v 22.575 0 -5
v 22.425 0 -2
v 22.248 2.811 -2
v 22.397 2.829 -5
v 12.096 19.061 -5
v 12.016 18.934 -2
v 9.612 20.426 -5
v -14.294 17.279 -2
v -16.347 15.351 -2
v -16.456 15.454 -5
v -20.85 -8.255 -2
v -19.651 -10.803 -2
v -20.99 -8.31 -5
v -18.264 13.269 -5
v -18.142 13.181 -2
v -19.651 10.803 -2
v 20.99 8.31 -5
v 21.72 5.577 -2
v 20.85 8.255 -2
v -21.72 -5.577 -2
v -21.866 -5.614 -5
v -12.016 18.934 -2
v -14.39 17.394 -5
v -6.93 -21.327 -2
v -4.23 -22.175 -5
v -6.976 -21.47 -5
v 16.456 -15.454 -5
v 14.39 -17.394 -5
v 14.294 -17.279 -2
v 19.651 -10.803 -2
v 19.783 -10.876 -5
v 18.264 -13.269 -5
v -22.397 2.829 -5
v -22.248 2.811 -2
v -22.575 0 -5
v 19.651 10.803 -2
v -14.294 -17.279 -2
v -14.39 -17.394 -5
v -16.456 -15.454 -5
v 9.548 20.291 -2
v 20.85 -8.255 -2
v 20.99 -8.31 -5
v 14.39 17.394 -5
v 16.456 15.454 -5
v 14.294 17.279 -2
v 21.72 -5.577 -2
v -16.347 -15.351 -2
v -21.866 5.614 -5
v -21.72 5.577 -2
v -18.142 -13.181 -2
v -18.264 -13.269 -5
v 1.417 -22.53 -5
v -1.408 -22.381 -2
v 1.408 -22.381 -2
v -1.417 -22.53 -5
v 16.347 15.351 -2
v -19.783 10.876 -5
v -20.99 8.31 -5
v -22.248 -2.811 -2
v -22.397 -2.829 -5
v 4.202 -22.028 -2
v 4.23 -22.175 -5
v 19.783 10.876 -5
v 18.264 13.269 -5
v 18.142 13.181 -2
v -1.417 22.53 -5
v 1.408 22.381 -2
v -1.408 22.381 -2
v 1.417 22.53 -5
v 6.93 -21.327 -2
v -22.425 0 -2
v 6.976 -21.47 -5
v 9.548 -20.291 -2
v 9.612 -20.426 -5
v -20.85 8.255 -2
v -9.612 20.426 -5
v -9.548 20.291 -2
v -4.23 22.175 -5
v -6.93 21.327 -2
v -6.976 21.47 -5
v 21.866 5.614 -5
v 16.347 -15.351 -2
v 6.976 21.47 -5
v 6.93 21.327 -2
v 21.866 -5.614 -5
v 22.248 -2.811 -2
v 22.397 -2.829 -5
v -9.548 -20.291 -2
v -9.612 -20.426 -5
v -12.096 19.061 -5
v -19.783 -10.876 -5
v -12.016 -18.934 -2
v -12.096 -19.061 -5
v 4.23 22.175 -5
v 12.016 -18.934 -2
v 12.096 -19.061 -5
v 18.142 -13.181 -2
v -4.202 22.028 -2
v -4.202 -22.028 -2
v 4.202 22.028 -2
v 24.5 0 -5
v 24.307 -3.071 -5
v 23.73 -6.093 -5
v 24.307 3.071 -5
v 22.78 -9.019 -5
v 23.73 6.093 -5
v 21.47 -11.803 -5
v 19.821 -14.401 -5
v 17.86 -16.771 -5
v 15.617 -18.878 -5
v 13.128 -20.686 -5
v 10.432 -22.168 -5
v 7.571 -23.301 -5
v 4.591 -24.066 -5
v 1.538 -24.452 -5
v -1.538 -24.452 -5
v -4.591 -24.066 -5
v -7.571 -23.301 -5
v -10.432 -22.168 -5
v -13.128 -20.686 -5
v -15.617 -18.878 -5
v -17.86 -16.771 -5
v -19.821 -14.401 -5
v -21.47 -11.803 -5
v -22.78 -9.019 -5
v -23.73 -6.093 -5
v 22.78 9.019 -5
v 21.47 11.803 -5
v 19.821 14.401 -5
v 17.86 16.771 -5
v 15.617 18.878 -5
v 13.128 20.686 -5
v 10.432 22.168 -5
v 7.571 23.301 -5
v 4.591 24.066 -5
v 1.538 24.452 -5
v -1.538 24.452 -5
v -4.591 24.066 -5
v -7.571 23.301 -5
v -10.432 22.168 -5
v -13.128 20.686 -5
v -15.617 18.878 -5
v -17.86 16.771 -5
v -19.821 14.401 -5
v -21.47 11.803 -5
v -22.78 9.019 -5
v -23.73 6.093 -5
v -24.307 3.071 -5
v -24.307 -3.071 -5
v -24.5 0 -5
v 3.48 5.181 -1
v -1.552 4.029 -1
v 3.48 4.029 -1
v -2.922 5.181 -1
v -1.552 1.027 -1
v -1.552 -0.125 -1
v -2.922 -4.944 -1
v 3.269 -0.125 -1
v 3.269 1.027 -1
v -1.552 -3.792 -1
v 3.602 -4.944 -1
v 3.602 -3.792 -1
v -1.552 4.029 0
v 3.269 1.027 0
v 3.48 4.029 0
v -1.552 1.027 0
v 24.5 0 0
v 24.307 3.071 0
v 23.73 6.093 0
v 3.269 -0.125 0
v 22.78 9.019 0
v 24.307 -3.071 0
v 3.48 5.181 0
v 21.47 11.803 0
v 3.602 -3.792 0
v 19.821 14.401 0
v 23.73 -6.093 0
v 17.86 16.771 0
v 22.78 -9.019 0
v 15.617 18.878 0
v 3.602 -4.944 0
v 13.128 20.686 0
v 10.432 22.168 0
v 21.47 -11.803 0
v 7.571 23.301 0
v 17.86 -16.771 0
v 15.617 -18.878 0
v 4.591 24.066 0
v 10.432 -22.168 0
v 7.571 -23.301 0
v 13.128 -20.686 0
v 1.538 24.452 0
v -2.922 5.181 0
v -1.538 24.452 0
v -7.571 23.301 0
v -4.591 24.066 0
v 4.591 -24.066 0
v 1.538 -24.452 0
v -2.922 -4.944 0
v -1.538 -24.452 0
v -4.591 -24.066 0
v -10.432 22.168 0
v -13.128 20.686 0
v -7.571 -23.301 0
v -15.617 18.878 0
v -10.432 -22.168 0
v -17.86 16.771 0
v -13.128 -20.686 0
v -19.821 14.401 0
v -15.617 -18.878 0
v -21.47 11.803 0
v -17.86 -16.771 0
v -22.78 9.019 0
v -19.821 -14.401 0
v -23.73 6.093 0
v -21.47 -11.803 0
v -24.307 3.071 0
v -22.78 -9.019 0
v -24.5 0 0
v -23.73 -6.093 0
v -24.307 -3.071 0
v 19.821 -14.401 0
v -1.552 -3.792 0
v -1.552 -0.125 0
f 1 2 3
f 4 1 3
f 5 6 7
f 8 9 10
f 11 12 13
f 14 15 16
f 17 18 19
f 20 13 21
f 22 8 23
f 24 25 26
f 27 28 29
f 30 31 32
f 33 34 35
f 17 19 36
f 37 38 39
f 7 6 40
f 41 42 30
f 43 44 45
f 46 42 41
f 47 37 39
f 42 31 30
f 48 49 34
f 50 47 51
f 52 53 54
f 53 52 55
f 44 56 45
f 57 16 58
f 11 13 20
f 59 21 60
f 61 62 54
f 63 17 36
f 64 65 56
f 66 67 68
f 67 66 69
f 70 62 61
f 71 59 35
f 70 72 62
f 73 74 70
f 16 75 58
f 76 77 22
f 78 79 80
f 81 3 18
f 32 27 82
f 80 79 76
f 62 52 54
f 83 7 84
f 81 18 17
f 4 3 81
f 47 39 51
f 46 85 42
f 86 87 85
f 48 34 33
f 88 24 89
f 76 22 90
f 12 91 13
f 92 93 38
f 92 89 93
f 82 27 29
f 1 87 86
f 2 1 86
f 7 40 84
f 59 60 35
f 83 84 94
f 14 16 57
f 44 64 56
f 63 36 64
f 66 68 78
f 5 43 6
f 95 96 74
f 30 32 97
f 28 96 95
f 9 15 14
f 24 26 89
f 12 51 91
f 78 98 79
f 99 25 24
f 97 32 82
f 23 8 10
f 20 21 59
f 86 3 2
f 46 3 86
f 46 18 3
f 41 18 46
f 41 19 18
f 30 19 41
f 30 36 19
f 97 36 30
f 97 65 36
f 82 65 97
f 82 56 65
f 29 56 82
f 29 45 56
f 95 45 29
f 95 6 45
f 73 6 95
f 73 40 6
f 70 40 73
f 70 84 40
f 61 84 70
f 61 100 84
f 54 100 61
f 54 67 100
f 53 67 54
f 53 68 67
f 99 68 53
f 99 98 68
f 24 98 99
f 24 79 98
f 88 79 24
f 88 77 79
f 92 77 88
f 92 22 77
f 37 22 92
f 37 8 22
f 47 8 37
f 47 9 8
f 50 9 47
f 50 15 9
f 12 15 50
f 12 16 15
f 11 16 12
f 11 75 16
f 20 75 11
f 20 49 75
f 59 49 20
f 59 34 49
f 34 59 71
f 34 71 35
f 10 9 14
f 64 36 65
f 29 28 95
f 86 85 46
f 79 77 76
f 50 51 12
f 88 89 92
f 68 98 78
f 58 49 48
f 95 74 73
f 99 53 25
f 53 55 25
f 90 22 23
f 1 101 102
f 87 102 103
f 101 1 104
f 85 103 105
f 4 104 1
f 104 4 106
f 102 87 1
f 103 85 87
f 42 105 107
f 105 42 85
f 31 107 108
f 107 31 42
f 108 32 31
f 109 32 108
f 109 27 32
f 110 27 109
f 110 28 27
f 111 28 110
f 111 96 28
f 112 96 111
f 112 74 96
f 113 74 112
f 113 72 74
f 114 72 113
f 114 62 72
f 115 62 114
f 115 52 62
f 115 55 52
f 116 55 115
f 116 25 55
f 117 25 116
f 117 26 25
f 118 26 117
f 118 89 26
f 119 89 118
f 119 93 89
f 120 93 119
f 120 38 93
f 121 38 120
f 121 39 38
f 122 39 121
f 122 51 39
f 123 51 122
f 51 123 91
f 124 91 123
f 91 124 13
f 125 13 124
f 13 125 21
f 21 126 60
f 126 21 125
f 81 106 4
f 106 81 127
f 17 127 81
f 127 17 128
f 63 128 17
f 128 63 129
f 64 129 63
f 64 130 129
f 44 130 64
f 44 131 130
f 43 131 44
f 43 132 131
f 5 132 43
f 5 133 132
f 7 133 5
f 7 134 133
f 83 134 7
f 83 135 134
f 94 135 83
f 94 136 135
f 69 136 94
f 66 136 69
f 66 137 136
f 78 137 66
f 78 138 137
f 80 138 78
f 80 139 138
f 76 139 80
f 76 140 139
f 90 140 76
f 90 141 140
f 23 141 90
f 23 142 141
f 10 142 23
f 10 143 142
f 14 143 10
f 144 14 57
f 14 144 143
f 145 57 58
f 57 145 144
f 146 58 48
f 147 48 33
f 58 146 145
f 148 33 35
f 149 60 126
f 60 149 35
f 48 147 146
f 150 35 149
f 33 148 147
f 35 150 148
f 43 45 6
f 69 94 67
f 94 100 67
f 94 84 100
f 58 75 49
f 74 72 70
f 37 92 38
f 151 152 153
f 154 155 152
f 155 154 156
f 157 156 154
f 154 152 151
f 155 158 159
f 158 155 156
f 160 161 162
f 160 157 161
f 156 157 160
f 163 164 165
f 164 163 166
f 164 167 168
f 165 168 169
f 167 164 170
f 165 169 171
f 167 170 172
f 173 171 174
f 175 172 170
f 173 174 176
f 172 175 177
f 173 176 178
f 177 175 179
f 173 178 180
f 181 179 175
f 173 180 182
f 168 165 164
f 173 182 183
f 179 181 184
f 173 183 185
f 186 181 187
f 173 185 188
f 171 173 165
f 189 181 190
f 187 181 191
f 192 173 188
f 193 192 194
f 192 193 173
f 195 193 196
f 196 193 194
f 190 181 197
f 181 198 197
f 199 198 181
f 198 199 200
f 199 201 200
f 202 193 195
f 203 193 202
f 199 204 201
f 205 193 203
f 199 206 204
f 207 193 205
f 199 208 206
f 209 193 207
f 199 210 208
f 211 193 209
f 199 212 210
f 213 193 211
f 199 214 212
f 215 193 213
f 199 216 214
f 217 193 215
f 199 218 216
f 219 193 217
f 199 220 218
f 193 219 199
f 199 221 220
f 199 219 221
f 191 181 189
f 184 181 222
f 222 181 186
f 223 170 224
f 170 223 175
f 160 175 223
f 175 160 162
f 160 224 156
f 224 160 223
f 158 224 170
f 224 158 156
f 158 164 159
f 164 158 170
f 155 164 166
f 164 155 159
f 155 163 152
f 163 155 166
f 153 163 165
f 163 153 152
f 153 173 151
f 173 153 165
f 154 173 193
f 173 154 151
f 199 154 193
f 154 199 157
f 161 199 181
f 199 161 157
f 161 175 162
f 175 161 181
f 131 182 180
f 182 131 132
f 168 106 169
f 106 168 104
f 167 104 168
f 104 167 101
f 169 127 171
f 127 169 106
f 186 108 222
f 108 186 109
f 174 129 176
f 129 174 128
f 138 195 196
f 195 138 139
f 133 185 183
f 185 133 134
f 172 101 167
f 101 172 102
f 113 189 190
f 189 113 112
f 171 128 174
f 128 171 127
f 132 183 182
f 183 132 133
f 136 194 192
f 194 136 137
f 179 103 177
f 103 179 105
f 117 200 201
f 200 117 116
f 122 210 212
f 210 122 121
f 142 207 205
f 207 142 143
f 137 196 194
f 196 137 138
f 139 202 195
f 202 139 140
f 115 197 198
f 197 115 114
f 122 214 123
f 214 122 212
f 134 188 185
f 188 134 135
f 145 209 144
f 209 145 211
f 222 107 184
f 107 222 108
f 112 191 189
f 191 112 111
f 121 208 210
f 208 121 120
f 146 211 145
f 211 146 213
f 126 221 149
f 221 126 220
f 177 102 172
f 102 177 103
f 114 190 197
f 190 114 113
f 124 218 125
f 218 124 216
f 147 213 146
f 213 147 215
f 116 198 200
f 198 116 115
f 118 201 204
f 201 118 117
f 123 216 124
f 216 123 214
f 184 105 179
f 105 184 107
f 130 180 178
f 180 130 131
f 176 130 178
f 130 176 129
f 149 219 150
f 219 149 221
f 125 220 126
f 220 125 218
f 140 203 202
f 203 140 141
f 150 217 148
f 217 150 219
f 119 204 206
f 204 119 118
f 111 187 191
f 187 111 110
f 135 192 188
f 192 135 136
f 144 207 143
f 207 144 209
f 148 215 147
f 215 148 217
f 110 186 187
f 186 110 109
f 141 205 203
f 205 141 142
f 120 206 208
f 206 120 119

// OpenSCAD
$fn = 50;

difference() {
	union() {
		translate(v = [0, 0, -5.0]) {
			cylinder(h = 5, r = 24.5);
		}
	}
	union() {
		#translate(v = [0, 0, -5.0]) {
			cylinder(h = 3, r1 = 22.575, r2 = 22.425);
		}
		translate(v = [0, 0, -1]) {
			linear_extrude(height = 1) {
				text(font = "Impact", halign = "center", size = 10, text = "E", valign = "center");
			}
		}
	}
}
